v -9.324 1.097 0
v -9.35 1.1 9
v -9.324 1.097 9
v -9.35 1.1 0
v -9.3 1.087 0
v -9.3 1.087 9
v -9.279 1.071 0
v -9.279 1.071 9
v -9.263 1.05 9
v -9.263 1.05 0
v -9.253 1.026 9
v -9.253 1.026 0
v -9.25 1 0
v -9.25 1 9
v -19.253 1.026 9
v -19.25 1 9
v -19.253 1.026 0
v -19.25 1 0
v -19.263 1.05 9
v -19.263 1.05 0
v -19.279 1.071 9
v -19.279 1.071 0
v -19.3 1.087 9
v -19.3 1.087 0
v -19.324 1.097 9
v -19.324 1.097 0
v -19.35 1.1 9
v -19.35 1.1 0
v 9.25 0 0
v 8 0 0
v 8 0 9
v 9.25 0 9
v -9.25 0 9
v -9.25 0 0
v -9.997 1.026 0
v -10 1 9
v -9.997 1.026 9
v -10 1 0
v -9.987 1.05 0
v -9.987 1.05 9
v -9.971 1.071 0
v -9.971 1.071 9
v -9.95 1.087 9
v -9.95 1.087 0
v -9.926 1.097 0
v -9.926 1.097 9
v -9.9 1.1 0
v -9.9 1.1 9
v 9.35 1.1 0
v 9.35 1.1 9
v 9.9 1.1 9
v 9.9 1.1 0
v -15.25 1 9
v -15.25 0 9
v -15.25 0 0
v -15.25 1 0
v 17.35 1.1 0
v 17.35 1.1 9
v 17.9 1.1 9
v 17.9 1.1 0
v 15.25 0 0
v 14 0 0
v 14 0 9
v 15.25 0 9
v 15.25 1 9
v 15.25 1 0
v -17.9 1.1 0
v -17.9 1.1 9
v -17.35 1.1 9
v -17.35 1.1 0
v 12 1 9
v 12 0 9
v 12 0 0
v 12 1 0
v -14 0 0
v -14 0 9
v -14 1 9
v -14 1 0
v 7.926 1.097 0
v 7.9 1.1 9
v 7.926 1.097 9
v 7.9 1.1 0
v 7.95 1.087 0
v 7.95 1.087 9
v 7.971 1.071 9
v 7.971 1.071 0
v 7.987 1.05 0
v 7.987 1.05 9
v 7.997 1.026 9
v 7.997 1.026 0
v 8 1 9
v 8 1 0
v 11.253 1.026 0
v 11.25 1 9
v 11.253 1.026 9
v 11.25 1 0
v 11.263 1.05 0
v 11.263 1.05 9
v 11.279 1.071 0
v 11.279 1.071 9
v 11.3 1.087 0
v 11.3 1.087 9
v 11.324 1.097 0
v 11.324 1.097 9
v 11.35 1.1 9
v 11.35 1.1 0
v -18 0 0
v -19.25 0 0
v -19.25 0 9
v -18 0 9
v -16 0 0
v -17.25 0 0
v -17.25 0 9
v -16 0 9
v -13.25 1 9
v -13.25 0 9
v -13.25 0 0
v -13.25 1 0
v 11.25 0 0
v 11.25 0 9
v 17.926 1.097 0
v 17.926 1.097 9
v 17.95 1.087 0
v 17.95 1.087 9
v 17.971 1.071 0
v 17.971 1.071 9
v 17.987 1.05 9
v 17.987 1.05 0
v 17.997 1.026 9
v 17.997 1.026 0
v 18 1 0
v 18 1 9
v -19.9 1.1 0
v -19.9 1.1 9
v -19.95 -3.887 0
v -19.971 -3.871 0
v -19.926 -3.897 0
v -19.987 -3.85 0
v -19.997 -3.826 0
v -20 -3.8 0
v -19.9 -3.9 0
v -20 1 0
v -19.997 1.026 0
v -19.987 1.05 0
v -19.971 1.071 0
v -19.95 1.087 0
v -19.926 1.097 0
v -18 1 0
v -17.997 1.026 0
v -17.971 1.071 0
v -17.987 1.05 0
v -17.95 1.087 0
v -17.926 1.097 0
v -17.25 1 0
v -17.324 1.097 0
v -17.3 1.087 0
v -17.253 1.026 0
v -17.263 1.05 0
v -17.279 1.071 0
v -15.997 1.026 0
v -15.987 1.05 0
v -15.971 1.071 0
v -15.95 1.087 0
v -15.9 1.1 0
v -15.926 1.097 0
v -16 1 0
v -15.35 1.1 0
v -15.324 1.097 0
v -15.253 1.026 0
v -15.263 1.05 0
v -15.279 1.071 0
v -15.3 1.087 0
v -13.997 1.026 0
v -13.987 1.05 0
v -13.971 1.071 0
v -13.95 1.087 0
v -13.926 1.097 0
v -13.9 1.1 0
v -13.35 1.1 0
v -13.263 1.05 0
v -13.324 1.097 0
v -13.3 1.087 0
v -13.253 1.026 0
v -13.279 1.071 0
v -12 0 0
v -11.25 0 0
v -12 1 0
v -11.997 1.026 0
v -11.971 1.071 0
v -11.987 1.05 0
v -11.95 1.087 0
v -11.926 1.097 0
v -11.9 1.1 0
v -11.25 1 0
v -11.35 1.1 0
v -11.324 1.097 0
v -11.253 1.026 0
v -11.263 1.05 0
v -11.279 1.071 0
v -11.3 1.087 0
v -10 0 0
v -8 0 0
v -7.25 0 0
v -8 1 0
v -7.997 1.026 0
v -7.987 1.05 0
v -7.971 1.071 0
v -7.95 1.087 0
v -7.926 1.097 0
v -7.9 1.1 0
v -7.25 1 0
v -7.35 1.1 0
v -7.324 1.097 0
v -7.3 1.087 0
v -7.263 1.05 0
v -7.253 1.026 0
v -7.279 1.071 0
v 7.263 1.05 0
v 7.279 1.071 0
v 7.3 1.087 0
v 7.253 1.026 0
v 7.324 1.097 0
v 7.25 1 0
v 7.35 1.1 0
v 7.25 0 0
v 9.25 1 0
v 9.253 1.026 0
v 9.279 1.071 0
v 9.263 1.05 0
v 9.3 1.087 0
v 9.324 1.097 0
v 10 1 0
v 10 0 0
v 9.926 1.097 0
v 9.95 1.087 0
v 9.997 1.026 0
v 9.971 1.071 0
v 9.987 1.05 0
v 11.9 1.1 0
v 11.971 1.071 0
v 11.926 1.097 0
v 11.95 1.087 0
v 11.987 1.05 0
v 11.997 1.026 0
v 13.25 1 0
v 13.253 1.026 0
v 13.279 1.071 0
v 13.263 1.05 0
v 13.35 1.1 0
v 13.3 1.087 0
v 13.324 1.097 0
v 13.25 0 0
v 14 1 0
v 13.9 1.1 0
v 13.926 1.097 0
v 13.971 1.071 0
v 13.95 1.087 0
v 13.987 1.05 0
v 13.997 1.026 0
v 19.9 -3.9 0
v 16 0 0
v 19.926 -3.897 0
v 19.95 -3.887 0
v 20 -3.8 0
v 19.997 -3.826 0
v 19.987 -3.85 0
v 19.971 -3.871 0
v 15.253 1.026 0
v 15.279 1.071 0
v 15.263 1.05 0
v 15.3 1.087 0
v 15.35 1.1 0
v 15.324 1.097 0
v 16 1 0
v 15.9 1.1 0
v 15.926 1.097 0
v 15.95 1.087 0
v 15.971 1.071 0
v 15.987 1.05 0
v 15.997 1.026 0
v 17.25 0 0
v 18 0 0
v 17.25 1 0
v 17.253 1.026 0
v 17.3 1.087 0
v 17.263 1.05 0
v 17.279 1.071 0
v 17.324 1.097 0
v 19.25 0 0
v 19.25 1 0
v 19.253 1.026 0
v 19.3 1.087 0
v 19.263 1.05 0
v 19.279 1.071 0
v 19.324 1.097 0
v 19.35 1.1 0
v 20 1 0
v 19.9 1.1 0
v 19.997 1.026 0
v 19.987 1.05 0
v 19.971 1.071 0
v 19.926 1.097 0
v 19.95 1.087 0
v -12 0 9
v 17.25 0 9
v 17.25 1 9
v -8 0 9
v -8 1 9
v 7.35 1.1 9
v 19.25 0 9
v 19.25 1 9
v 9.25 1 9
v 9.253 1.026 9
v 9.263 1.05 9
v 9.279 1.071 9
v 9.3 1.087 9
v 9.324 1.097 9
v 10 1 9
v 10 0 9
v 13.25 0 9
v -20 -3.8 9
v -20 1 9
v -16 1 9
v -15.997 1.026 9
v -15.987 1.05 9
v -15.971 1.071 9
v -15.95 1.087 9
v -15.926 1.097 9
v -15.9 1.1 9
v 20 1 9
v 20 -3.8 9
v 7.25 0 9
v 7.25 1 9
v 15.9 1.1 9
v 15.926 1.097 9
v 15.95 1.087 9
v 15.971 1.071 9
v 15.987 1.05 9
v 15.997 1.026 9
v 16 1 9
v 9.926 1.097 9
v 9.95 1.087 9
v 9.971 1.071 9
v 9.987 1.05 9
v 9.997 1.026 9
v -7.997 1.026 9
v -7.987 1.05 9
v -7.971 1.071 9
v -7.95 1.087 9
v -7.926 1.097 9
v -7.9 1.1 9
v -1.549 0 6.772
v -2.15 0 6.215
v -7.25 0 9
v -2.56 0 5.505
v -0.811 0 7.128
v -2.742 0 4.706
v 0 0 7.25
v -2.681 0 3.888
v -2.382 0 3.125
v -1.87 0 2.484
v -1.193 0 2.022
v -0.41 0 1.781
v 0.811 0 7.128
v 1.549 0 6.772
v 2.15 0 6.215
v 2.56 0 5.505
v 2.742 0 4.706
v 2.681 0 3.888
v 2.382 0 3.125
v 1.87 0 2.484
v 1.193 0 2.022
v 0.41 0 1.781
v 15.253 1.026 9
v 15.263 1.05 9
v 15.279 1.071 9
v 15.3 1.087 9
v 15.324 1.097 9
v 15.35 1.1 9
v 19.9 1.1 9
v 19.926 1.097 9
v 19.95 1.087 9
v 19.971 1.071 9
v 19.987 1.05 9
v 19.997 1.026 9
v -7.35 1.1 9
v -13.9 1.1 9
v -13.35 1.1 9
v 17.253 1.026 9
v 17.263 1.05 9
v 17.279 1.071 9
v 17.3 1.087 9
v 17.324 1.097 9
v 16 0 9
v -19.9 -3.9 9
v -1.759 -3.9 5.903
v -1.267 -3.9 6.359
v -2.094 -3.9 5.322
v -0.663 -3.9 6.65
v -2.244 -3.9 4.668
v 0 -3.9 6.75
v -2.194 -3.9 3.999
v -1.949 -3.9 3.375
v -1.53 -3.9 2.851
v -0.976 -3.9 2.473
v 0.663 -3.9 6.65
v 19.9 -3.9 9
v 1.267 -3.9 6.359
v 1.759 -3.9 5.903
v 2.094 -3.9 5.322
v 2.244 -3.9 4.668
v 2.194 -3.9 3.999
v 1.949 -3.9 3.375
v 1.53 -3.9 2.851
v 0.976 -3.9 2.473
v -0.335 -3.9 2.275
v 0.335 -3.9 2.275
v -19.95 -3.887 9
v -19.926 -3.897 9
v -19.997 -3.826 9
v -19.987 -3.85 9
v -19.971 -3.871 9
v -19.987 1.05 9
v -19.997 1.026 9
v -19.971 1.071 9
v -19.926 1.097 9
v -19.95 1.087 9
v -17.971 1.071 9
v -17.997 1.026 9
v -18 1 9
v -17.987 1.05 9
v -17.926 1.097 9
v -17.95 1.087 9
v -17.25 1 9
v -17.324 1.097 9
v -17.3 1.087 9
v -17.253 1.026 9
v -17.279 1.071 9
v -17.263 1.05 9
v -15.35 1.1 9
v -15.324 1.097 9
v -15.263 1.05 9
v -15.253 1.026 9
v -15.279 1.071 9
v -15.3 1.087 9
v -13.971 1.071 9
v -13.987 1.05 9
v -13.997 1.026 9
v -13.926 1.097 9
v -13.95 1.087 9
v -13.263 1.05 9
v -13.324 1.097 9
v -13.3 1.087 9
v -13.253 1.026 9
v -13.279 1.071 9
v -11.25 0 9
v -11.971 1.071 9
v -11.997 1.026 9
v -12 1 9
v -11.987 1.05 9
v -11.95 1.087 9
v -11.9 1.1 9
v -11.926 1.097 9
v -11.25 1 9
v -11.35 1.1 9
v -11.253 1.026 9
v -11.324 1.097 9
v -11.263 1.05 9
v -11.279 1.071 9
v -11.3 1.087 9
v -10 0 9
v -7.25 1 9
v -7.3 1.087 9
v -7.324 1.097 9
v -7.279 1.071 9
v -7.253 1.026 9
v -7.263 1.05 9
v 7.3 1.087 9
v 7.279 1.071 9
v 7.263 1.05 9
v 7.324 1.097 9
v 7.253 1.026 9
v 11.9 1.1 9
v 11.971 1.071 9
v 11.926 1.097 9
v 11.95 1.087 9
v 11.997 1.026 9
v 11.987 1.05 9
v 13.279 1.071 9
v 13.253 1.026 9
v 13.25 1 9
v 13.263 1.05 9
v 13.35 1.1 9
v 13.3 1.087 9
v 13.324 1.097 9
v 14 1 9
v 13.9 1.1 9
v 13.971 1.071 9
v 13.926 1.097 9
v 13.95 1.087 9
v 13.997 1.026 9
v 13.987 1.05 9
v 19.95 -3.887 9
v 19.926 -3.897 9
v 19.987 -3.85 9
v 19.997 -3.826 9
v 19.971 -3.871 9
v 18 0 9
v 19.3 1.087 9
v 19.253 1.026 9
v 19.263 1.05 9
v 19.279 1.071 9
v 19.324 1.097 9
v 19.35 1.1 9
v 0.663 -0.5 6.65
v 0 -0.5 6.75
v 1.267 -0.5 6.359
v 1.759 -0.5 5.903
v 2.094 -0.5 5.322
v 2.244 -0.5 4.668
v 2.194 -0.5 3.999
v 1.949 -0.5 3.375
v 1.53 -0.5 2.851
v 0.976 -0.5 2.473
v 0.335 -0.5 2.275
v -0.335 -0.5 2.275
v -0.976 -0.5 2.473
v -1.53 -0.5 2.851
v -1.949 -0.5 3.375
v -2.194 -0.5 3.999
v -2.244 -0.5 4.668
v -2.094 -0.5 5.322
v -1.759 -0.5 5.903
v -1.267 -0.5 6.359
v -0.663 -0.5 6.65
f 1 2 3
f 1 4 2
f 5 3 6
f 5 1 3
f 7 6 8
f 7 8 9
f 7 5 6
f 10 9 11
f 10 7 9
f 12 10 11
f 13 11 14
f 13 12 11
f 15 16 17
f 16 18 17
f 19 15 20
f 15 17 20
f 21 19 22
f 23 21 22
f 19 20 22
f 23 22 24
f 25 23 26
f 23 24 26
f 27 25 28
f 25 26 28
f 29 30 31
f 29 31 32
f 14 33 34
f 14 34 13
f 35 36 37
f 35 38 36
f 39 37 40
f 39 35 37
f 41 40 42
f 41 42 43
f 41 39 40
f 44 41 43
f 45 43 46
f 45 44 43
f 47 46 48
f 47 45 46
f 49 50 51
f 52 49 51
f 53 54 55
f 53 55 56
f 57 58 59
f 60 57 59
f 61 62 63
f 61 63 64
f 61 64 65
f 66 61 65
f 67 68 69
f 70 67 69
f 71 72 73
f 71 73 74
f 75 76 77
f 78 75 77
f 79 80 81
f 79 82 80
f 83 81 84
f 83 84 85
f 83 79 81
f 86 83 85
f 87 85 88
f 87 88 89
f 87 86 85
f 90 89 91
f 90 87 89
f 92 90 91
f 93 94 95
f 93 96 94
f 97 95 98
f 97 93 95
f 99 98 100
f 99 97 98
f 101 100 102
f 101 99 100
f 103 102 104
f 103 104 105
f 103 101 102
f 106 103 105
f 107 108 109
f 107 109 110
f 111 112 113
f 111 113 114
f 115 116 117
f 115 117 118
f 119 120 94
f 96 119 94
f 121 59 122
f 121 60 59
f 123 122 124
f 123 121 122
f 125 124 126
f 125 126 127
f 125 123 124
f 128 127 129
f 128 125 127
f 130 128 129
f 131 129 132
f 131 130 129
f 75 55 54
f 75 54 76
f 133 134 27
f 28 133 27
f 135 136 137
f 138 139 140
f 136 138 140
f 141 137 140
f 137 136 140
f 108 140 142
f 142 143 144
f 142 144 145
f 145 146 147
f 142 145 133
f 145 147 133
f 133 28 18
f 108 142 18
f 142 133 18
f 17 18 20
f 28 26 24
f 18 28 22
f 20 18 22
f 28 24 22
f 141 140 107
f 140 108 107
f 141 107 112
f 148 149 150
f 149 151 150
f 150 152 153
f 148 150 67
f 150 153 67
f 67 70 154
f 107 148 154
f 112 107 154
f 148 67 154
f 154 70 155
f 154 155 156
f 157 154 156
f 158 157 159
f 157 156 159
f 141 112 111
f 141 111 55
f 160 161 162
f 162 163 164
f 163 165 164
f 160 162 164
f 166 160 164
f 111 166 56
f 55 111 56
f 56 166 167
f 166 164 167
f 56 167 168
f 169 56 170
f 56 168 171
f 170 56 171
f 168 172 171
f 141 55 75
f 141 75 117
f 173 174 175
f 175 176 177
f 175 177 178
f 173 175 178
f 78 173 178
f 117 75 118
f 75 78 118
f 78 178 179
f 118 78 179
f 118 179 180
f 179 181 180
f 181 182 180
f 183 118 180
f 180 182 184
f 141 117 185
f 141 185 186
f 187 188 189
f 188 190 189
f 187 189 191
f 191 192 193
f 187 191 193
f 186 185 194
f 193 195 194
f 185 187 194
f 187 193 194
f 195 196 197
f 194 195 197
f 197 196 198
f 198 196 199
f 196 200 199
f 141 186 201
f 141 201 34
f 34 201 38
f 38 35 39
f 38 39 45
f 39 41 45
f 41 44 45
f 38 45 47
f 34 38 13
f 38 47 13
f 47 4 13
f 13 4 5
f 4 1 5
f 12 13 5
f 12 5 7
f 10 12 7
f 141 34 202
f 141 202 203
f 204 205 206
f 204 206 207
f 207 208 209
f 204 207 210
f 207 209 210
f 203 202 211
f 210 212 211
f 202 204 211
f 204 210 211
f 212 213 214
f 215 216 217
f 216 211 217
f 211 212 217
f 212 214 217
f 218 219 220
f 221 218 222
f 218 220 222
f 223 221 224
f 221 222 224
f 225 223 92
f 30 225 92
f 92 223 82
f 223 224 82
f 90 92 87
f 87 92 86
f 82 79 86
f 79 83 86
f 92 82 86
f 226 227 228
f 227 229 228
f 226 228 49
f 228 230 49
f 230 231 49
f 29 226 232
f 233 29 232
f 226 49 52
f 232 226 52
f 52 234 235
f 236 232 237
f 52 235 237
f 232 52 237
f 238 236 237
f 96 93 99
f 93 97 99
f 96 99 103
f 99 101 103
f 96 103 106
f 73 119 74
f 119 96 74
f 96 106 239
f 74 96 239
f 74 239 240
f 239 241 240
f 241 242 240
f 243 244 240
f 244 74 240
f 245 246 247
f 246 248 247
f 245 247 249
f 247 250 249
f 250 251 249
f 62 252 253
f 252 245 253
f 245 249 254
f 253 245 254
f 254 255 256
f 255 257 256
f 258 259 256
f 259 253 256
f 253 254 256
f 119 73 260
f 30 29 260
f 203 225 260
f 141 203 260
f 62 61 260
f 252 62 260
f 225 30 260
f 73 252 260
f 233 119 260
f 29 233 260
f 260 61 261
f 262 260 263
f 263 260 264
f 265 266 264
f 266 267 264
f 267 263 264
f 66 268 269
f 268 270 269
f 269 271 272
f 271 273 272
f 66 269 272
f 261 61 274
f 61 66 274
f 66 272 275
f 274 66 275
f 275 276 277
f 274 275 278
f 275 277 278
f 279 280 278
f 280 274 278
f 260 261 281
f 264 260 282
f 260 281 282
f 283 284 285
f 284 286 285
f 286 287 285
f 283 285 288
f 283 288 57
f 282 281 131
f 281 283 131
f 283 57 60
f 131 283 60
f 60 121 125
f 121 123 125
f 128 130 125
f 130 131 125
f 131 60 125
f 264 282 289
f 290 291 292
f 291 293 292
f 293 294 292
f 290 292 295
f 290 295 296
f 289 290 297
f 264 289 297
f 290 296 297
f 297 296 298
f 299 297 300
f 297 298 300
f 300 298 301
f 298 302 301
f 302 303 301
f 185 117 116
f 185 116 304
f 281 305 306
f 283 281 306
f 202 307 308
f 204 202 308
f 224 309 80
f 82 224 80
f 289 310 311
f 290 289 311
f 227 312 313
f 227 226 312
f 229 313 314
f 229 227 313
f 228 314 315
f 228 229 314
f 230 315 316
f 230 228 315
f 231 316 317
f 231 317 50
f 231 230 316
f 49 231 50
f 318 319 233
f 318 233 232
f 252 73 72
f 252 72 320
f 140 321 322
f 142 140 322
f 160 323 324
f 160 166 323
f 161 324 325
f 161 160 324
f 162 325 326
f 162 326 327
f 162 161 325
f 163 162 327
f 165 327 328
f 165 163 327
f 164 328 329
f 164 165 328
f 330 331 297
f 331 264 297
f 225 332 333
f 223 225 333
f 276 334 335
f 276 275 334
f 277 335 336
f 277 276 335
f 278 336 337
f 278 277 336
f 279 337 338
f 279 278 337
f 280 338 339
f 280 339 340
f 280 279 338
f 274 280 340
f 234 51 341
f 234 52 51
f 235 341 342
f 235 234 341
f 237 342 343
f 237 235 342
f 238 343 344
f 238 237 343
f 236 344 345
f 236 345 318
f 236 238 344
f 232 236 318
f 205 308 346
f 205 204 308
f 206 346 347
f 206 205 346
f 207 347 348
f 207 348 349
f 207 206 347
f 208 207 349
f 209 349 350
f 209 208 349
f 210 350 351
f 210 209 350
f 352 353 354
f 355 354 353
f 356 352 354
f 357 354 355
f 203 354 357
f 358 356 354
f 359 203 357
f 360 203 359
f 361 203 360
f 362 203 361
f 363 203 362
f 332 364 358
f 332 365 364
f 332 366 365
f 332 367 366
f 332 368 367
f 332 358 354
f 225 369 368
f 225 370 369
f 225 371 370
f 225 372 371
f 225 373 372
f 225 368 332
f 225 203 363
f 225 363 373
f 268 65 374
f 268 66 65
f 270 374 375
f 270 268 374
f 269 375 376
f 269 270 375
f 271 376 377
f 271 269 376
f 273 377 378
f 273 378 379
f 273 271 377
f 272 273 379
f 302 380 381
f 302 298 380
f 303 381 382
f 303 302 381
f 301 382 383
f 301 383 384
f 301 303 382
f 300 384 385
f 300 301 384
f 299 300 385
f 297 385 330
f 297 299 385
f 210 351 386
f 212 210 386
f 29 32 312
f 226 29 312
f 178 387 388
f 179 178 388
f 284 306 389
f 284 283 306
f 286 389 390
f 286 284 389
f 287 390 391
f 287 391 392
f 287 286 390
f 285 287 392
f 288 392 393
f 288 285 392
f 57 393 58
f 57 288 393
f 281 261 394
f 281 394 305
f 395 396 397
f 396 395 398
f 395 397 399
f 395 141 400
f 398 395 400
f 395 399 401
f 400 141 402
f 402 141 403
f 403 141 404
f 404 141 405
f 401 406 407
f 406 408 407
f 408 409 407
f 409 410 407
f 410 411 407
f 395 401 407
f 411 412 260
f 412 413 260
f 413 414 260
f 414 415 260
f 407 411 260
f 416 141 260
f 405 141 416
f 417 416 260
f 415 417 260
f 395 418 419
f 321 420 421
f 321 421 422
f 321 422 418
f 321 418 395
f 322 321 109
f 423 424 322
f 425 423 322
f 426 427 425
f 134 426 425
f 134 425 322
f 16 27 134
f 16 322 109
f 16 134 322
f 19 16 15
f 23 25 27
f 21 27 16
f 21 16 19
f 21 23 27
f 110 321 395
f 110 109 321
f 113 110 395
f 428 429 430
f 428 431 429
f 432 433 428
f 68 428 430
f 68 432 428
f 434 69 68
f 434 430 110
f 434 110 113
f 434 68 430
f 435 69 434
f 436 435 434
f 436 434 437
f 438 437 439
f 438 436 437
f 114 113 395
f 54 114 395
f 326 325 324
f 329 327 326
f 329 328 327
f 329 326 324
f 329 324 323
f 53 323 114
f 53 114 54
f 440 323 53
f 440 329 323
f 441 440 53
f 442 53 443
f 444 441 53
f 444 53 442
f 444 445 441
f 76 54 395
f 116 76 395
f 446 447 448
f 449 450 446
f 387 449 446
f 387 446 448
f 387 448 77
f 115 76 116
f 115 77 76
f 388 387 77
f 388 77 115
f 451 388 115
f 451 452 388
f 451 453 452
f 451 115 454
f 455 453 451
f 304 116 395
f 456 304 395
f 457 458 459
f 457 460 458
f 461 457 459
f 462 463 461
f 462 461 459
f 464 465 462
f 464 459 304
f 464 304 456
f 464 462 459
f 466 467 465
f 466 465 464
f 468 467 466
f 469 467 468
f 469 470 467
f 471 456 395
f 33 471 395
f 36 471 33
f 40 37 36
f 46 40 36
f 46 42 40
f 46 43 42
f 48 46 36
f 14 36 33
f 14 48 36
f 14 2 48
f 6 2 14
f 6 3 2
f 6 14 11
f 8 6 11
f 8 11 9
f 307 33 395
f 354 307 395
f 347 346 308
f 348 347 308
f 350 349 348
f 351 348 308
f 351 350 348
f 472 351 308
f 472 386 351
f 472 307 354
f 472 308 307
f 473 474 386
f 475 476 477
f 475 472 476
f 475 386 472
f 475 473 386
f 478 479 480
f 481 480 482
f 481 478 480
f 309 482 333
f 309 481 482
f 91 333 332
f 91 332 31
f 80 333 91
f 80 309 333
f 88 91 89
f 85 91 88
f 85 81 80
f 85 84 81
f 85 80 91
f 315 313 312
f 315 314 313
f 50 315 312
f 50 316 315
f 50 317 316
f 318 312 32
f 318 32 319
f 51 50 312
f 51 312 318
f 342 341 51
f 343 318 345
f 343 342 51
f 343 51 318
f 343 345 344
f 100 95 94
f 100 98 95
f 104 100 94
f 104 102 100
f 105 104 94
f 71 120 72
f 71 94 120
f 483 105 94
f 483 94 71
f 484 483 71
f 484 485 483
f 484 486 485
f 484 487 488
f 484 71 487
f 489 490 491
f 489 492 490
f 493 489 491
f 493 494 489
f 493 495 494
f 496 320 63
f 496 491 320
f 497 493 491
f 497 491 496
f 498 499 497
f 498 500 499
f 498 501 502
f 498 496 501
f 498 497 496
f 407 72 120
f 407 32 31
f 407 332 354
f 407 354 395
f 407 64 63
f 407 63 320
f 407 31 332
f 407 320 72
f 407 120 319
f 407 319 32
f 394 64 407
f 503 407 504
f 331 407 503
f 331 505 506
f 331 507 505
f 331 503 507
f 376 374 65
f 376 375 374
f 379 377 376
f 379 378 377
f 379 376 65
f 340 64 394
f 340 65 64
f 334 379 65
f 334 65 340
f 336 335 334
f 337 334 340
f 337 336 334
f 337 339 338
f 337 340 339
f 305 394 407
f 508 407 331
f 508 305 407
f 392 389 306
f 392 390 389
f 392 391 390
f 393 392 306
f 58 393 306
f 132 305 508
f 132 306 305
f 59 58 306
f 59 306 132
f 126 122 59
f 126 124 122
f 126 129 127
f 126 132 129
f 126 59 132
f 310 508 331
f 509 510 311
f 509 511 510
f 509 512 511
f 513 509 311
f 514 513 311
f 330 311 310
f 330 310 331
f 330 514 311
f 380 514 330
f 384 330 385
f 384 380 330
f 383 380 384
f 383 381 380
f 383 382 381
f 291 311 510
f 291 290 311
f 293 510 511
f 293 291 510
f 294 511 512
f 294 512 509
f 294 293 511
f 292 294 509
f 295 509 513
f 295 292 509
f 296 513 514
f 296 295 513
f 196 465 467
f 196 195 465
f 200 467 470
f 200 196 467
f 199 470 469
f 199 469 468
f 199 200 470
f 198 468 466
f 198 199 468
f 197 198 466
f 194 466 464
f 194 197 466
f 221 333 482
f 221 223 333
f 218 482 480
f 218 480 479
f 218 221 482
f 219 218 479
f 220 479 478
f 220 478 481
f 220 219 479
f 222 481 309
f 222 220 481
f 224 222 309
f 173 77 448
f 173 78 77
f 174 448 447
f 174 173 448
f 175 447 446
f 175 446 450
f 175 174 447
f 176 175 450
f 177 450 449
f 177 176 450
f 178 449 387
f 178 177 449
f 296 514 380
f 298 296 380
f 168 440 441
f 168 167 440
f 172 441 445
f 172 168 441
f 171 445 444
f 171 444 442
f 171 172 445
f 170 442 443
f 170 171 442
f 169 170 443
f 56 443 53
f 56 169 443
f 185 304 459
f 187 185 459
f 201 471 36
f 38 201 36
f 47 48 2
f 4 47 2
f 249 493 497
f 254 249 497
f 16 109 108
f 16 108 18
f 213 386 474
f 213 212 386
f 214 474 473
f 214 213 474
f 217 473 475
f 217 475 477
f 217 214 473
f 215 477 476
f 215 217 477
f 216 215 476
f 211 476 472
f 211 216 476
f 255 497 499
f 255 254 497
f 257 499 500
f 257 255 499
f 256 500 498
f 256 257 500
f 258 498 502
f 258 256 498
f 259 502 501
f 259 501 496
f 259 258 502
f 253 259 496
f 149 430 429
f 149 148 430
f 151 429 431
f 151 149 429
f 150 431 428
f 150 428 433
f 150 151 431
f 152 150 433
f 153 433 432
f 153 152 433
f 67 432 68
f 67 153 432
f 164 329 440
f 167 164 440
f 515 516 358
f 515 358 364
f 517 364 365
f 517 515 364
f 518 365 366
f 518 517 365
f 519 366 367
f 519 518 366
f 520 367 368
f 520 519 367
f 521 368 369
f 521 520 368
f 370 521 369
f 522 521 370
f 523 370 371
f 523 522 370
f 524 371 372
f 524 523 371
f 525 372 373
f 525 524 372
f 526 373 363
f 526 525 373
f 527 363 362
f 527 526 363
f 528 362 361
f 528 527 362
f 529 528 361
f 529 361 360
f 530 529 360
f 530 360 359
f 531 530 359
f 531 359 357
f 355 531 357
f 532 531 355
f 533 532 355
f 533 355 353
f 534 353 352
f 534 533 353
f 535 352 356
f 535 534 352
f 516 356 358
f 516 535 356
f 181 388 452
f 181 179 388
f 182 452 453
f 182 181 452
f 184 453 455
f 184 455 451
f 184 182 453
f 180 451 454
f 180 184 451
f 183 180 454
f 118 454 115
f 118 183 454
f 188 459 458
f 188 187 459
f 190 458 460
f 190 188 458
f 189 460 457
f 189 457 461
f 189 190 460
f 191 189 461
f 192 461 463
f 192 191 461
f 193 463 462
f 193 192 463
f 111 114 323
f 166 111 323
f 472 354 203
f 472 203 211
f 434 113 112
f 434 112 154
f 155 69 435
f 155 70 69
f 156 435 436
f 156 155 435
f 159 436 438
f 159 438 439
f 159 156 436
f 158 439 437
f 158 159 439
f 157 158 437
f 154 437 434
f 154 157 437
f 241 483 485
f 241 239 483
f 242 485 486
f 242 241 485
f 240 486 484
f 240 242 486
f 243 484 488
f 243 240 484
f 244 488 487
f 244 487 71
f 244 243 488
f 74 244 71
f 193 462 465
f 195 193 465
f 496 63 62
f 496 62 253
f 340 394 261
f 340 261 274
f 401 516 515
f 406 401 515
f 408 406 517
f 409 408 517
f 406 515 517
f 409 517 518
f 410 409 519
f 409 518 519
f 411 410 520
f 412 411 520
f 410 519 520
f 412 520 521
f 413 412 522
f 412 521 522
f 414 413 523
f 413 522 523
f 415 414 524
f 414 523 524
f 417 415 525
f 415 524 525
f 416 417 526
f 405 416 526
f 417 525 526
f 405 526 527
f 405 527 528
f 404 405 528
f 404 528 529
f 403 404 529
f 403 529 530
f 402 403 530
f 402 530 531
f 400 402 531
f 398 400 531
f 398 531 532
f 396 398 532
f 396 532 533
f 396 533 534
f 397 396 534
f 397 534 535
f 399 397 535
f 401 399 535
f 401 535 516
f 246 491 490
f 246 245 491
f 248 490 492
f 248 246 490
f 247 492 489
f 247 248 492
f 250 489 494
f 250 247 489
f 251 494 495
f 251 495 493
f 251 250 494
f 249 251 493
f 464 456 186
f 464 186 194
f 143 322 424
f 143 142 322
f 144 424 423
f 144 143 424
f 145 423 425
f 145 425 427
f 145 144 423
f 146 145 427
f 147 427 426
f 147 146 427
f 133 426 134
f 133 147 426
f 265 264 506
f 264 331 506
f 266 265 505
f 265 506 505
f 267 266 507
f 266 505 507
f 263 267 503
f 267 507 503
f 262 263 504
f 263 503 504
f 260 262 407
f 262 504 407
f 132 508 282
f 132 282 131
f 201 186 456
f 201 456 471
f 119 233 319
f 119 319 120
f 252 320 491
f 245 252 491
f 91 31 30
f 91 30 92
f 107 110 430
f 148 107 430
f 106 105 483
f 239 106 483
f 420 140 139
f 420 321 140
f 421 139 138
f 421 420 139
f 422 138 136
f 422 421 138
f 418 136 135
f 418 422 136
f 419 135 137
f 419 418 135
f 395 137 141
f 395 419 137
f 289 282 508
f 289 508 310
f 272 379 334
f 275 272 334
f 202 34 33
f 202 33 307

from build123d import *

# Parameters (mm, degrees)
SKETCH1_W           = 40
SKETCH1_H           = 3.9
BOSS_EXTRUDE1_DEPTH = 9
CUT_EXTRUDE1_REACH  = 24.276
SKETCH2_R           = 2.25
SKETCH3_W           = 0.75
SKETCH3_H           = 1.1
BOSS_EXTRUDE2_DEPTH = 9
FILLET1_R           = 0.1
CHAMFER1_SIZE       = 0.5


with BuildPart() as part:
    # Sketch1 → Boss-Extrude1 (new body)
    with BuildSketch(Plane.XY):
        with Locations((0, -1.95)):
            Rectangle(SKETCH1_W, SKETCH1_H)
    extrude(amount=BOSS_EXTRUDE1_DEPTH)

    # Sketch2 → Cut-Extrude1 (cut, up to next)
    with BuildSketch(Plane(origin=(0, 0, 0), x_dir=(1, 0, 0), z_dir=(0, 1, 0)), mode=Mode.PRIVATE) as cut_extrude1_sk1:
        with Locations(Location((0, -4.5, 0), (0, 0, 270))):
            Circle(SKETCH2_R)
    cut_extrude1_tool1 = extrude(cut_extrude1_sk1.sketch, amount=-CUT_EXTRUDE1_REACH, mode=Mode.PRIVATE) & part.part
    add(cut_extrude1_tool1.solids().sort_by_distance((0, 0, 4.5))[0], mode=Mode.SUBTRACT)

    # Sketch3 → Boss-Extrude2 (add)
    with BuildSketch(Plane.XY.offset(9)):
        with Locations((-17.625, 0.55)):
            Rectangle(SKETCH3_W, SKETCH3_H)
        with Locations((-19.625, 0.55)):
            Rectangle(SKETCH3_W, SKETCH3_H)
        with Locations((-15.625, 0.55)):
            Rectangle(SKETCH3_W, SKETCH3_H)
        with Locations((-13.625, 0.55)):
            Rectangle(SKETCH3_W, SKETCH3_H)
        with Locations((-11.625, 0.55)):
            Rectangle(SKETCH3_W, SKETCH3_H)
        with Locations((-9.625, 0.55)):
            Rectangle(SKETCH3_W, SKETCH3_H)
        with Locations((-7.625, 0.55)):
            Rectangle(SKETCH3_W, SKETCH3_H)
        with Locations((7.625, 0.55)):
            Rectangle(SKETCH3_W, SKETCH3_H)
        with Locations((9.625, 0.55)):
            Rectangle(SKETCH3_W, SKETCH3_H)
        with Locations((11.625, 0.55)):
            Rectangle(SKETCH3_W, SKETCH3_H)
        with Locations((13.625, 0.55)):
            Rectangle(SKETCH3_W, SKETCH3_H)
        with Locations((15.625, 0.55)):
            Rectangle(SKETCH3_W, SKETCH3_H)
        with Locations((17.625, 0.55)):
            Rectangle(SKETCH3_W, SKETCH3_H)
        with Locations((19.625, 0.55)):
            Rectangle(SKETCH3_W, SKETCH3_H)
    extrude(amount=-BOSS_EXTRUDE2_DEPTH)

    # Fillet1
    fillet1_edges = [part.edges().sort_by_distance(p)[0] for p in [
        (9.25, 1.1, 4.5),
        (10, 1.1, 4.5),
        (11.25, 1.1, 4.5),
        (12, 1.1, 4.5),
        (13.25, 1.1, 4.5),
        (14, 1.1, 4.5),
        (15.25, 1.1, 4.5),
        (16, 1.1, 4.5),
        (17.25, 1.1, 4.5),
        (18, 1.1, 4.5),
        (19.25, 1.1, 4.5),
        (20, 1.1, 4.5),
        (-20, 1.1, 4.5),
        (-19.25, 1.1, 4.5),
        (-18, 1.1, 4.5),
        (-17.25, 1.1, 4.5),
        (-16, 1.1, 4.5),
        (-15.25, 1.1, 4.5),
        (-14, 1.1, 4.5),
        (-13.25, 1.1, 4.5),
        (-12, 1.1, 4.5),
        (-11.25, 1.1, 4.5),
        (-10, 1.1, 4.5),
        (-9.25, 1.1, 4.5),
        (20, -3.9, 4.5),
        (-20, -3.9, 4.5),
        (-8, 1.1, 4.5),
        (-7.25, 1.1, 4.5),
        (7.25, 1.1, 4.5),
        (8, 1.1, 4.5),
    ]]
    fillet(fillet1_edges, radius=FILLET1_R)

    # Chamfer1
    chamfer1_edges = [part.edges().sort_by_distance(p)[0] for p in [
        (0, 0, 2.25),
    ]]
    chamfer(chamfer1_edges, length=CHAMFER1_SIZE)


solid = part.part
